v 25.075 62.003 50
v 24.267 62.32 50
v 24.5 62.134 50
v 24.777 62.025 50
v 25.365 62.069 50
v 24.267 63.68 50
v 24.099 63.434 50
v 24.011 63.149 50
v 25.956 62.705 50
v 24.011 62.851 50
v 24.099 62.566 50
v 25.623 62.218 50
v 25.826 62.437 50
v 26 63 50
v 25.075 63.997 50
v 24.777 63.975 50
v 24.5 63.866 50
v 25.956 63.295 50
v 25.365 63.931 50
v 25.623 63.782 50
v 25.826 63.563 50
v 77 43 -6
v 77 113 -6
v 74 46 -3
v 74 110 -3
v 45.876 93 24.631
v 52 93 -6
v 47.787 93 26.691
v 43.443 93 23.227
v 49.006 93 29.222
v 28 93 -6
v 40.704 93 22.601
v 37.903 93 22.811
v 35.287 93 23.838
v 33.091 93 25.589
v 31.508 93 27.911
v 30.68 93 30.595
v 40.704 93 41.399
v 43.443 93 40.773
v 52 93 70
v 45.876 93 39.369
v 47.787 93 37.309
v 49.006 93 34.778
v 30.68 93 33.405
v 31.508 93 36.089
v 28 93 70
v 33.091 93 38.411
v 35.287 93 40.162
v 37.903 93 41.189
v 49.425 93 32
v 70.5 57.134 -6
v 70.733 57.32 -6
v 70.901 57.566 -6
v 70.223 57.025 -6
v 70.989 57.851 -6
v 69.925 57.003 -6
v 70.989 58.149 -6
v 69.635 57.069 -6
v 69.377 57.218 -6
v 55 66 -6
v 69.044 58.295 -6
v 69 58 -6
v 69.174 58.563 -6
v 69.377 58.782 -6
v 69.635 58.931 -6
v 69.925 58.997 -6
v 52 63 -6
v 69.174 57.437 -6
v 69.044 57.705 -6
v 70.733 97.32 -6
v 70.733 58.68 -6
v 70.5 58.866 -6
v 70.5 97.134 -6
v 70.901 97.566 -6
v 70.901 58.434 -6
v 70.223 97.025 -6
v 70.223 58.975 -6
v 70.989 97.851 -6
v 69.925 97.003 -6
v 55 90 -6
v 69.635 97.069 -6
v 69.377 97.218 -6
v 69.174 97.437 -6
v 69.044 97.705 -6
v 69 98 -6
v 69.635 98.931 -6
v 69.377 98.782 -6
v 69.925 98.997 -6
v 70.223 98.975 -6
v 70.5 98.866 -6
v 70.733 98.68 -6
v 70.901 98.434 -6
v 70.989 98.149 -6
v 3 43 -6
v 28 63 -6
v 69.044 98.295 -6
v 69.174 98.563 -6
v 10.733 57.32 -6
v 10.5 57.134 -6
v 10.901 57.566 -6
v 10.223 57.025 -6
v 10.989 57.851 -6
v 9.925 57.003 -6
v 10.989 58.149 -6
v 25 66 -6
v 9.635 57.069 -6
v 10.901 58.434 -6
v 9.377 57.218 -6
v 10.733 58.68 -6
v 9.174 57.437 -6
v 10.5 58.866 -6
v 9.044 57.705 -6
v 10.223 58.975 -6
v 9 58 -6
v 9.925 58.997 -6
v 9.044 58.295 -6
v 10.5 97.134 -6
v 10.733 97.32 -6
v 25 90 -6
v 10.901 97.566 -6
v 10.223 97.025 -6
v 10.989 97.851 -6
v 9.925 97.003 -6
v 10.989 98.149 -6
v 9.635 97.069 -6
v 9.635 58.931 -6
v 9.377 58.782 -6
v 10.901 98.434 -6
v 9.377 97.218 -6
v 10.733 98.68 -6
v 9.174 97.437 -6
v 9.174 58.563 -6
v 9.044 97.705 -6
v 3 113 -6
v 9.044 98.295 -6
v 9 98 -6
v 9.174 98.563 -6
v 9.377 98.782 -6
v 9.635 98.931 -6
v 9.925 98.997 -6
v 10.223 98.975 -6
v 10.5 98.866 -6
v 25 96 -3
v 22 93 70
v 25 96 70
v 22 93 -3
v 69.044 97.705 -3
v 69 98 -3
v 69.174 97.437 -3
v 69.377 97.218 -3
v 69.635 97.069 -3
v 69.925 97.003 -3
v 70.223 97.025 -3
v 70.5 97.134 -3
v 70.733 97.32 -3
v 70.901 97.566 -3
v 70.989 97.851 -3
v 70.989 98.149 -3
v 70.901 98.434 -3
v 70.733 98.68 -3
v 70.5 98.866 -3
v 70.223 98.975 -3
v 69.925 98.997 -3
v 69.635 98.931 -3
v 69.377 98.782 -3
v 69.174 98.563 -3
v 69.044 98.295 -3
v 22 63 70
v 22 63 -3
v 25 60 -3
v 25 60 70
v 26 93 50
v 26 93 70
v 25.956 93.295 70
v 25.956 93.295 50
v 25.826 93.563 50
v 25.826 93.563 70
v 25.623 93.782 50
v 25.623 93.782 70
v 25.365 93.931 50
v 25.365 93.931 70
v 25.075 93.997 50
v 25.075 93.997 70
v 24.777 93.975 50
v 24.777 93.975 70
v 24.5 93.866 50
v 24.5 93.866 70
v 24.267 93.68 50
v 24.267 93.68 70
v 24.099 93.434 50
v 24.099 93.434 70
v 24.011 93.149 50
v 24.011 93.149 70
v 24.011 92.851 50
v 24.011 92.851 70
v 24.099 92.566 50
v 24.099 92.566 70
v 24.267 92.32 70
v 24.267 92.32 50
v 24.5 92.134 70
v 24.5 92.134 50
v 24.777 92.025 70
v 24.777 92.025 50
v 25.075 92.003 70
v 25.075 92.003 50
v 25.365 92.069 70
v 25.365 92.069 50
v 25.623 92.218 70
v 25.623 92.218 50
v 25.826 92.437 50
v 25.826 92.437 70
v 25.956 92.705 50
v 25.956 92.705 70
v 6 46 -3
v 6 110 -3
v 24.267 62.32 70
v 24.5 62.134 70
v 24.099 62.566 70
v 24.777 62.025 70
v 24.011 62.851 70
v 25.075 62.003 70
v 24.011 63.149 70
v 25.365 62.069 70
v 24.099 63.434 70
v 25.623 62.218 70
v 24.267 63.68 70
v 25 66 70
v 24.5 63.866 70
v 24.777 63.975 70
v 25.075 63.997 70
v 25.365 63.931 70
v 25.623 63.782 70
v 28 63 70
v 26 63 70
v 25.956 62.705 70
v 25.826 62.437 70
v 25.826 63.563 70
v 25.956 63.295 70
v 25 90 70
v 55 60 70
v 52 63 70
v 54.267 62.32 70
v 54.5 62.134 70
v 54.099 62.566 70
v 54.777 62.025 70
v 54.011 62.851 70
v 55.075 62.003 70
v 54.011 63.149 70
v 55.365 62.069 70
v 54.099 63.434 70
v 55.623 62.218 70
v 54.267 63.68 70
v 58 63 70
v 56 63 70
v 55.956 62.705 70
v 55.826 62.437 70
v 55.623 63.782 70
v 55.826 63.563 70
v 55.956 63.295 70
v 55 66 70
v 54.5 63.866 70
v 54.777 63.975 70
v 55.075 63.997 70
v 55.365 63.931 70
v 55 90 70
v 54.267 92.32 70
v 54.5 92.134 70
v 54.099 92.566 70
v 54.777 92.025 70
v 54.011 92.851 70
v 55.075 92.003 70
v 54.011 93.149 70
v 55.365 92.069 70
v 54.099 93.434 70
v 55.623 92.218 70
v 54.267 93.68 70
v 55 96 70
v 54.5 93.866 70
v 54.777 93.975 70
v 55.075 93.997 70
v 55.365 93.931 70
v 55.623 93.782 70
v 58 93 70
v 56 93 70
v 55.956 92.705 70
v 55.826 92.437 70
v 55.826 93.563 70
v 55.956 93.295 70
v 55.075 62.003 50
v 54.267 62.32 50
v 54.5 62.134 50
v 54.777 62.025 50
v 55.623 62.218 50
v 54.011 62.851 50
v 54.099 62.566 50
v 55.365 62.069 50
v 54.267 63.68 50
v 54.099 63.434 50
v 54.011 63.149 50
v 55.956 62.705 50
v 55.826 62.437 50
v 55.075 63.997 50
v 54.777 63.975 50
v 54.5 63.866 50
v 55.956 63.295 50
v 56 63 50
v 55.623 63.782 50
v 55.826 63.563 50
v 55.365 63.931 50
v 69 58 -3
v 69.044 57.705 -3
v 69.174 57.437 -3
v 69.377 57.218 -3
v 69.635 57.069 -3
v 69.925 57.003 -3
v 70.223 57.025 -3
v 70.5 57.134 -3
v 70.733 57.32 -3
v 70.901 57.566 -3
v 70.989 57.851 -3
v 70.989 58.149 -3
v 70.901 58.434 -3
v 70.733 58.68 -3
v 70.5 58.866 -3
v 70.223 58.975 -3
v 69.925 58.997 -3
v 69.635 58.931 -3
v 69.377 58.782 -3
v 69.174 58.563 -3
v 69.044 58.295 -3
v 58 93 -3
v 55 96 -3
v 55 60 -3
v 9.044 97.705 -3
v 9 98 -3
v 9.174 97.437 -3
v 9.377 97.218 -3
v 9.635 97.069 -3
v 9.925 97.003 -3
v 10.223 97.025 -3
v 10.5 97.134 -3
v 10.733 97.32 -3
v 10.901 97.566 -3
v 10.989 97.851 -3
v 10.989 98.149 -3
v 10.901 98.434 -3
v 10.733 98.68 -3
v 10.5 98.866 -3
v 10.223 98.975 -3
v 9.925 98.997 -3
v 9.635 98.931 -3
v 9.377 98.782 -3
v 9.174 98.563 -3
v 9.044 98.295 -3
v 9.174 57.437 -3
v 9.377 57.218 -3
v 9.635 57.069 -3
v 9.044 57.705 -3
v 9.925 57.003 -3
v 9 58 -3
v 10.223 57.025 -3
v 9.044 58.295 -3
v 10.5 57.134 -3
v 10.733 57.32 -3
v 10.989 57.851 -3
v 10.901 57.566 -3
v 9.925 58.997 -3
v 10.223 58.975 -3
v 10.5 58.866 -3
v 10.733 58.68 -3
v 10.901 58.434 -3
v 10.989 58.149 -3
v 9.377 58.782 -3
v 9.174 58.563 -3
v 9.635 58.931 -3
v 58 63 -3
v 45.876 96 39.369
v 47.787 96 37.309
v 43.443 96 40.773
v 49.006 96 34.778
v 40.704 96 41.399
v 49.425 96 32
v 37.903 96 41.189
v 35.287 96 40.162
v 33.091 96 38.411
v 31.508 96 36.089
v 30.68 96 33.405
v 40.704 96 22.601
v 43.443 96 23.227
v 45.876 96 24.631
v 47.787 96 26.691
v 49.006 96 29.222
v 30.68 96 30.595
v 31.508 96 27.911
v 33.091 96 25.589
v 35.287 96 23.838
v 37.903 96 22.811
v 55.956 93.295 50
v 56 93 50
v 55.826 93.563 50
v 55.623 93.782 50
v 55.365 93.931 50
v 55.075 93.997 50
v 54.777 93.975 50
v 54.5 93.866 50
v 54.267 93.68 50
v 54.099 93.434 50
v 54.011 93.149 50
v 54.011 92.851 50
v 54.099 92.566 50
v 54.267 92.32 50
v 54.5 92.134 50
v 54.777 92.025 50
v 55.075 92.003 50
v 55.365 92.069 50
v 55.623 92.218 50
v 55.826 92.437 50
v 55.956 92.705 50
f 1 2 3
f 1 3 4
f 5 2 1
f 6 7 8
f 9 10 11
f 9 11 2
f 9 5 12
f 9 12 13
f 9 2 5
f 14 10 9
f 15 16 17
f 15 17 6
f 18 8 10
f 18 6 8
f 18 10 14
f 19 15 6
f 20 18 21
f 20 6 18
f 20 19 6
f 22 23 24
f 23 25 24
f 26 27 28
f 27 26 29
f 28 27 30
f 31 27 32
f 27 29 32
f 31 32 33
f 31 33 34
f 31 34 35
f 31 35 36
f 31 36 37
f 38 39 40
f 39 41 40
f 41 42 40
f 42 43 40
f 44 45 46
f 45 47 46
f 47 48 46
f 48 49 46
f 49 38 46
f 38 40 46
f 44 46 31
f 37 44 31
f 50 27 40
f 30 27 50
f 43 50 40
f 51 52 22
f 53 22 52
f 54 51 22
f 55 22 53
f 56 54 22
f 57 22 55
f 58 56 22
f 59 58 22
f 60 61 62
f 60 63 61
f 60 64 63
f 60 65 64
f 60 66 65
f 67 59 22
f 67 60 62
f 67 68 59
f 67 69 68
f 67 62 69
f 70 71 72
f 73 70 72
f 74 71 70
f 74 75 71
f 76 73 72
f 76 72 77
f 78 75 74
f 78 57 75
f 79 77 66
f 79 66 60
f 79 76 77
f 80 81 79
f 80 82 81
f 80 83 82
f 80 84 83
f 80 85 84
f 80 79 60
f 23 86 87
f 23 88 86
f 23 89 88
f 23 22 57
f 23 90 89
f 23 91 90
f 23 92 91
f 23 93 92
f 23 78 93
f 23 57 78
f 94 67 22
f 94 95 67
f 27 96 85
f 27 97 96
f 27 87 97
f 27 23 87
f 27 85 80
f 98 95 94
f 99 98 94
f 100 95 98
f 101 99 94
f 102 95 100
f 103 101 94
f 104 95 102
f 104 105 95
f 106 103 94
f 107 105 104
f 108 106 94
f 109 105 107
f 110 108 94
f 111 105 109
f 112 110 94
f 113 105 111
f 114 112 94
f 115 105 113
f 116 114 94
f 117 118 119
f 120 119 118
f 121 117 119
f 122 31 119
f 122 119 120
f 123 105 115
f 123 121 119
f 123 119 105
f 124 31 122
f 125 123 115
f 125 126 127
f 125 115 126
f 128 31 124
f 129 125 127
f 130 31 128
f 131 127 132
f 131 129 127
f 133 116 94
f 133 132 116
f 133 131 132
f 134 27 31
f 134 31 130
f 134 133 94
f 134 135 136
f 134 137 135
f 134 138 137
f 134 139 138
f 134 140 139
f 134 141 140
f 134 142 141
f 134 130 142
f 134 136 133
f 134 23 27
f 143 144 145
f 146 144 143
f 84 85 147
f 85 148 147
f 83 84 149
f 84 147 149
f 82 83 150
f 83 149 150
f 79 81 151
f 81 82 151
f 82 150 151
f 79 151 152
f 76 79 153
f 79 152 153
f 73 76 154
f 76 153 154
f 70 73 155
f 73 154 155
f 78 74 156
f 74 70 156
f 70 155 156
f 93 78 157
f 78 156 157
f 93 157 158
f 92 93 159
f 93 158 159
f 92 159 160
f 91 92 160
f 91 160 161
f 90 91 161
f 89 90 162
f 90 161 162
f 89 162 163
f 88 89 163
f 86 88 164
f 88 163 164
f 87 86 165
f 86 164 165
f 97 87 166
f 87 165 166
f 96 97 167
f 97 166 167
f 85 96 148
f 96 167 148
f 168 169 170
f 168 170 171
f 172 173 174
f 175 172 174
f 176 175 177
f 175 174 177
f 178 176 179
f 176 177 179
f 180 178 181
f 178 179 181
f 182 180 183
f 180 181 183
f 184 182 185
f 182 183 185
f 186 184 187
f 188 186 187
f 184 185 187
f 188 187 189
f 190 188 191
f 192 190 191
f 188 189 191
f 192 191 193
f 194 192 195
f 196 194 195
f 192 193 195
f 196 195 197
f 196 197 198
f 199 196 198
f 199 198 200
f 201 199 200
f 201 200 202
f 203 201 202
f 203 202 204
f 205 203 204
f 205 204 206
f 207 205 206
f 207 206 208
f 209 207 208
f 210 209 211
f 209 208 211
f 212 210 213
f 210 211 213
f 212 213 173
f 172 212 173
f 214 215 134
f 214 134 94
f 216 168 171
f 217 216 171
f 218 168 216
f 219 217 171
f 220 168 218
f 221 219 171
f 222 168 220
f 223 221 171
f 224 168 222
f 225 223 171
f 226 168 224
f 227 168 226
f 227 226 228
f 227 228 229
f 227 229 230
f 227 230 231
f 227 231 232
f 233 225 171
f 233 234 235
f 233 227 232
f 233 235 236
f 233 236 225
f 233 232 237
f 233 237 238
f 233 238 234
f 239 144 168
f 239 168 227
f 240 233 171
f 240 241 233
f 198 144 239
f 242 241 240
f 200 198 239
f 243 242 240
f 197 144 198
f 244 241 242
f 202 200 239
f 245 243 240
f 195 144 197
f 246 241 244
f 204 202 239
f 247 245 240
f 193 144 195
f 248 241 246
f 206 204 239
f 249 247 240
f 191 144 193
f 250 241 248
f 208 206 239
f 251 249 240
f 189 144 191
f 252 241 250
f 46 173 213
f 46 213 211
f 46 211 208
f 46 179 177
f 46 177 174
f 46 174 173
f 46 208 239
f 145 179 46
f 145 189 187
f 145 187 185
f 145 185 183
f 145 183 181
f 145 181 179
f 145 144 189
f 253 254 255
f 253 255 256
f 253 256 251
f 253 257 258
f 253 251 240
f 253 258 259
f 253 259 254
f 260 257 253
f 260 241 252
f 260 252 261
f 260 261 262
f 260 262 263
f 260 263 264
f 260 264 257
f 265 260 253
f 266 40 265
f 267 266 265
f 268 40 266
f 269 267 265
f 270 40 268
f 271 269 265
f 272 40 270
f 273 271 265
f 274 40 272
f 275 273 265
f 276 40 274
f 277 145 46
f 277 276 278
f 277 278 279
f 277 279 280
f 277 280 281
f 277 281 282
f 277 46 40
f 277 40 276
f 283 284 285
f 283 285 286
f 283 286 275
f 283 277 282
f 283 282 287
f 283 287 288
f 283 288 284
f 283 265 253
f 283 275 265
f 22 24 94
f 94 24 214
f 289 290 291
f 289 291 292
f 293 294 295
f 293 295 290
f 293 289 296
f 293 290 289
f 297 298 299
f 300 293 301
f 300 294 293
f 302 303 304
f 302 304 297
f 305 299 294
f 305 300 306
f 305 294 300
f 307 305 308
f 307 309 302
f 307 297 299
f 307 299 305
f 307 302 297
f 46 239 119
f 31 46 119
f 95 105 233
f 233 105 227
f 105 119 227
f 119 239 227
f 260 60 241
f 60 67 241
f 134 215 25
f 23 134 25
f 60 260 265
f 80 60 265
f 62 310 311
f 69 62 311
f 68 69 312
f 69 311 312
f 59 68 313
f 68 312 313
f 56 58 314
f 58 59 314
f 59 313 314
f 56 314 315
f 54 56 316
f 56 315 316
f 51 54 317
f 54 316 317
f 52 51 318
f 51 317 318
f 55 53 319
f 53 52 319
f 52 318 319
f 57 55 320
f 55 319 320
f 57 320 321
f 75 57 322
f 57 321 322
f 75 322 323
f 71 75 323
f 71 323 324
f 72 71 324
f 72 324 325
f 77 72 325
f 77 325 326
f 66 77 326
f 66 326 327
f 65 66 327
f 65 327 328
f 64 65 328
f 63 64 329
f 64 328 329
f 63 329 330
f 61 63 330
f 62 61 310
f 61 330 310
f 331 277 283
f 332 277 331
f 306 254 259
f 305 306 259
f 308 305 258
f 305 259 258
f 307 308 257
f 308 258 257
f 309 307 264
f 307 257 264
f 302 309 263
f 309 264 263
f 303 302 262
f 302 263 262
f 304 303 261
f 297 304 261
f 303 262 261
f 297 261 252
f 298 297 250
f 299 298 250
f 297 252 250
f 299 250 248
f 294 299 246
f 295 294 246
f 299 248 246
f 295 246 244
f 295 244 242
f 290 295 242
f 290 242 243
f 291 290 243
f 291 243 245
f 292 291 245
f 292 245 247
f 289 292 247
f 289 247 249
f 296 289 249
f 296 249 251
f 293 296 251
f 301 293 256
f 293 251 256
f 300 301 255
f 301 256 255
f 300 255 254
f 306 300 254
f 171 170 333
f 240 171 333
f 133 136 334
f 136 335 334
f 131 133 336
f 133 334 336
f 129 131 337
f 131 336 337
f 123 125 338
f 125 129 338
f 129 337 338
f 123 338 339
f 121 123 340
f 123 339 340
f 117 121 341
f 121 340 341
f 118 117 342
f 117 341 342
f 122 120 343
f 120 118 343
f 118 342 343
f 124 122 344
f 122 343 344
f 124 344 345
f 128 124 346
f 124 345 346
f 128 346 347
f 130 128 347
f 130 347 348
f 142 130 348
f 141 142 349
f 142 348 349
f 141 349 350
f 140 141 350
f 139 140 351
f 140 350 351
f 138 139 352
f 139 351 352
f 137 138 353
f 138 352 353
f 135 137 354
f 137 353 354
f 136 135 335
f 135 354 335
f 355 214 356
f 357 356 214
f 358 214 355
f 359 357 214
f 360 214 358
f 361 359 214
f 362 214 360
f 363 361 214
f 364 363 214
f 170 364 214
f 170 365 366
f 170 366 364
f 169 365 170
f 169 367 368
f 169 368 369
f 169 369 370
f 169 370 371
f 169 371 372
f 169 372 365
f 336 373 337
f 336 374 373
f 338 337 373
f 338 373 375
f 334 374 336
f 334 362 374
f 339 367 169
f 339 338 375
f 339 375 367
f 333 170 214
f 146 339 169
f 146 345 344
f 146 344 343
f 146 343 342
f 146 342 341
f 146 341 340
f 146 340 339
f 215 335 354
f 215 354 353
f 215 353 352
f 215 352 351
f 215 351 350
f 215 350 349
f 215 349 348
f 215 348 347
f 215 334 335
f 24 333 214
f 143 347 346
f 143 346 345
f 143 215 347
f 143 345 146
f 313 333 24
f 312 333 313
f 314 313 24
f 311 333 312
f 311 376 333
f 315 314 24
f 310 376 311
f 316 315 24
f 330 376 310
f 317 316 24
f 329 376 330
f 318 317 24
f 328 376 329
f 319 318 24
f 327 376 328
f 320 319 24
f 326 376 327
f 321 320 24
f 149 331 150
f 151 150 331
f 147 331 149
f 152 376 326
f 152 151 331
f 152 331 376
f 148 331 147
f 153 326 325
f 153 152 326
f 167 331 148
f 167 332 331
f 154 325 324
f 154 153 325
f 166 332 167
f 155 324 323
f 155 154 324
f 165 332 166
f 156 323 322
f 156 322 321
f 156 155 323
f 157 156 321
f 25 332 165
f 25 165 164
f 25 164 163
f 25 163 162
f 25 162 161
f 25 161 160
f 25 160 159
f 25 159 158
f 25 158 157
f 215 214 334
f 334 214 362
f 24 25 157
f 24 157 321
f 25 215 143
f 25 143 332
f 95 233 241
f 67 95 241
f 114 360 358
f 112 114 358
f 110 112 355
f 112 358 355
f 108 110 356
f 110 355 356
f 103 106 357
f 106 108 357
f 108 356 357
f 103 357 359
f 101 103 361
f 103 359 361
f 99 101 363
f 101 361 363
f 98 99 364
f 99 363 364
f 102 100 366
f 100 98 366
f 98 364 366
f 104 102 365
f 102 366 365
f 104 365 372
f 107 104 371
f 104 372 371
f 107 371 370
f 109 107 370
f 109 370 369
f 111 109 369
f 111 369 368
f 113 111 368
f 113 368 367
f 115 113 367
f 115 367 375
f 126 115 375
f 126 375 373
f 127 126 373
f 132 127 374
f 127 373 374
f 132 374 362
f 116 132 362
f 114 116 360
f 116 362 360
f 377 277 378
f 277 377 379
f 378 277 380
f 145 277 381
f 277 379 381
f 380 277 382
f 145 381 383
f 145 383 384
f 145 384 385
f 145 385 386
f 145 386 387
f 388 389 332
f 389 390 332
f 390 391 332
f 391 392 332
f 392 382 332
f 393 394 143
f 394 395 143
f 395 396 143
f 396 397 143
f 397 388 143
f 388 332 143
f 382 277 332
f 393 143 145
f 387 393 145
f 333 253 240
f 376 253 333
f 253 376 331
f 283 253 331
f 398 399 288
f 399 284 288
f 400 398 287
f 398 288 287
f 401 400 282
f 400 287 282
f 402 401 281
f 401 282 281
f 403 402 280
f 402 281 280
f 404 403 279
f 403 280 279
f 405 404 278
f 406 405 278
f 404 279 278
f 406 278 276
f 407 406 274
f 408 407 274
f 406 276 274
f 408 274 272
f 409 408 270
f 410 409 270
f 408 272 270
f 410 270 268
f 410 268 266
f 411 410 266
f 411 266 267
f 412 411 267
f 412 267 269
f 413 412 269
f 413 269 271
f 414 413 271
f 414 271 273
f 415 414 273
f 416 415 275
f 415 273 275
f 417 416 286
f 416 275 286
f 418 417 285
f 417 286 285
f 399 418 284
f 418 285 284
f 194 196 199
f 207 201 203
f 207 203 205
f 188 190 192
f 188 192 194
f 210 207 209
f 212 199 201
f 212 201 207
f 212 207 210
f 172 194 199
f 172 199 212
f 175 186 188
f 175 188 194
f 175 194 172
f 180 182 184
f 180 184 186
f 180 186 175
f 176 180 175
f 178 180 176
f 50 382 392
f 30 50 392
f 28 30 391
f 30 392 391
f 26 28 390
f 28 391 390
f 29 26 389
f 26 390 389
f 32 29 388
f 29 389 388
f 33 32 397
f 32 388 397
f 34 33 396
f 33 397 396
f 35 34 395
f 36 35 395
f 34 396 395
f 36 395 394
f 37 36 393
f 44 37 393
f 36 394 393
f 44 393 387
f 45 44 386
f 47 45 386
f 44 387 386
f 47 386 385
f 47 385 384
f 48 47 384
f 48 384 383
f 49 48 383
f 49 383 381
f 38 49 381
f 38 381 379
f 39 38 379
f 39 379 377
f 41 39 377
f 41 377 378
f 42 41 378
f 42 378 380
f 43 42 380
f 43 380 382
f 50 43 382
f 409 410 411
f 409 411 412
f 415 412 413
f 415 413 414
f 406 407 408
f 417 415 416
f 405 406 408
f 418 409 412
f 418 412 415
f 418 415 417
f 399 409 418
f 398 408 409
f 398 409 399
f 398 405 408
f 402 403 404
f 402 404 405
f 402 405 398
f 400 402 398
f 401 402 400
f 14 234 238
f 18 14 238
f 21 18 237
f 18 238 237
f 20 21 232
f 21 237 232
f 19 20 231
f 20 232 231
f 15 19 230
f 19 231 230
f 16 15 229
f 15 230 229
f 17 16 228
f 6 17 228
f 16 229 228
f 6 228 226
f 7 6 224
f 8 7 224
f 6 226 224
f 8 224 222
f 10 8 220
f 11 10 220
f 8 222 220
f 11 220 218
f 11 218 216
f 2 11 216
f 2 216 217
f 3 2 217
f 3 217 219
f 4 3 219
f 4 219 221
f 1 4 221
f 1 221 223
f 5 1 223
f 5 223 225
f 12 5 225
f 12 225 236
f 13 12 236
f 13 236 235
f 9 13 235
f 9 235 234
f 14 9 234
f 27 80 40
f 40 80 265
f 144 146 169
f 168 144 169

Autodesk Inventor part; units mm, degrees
ref_plane "YZ Plane" through (0, 0, 0) normal (1, 0, 0) x (0, 1, 0)
ref_plane "XZ Plane" through (0, 0, 0) normal (0, 1, 0) x (-1, 0, 0)
ref_plane "XY Plane" through (0, 0, 0) normal (0, 0, 1) x (1, 0, 0)
sketch "Sketch1" plane through (0, 0, 0) normal (0, 0, 1) x (1, 0, 0)
  line L0 (0, 0) -> (80, 0)
  line L1 (80, 0) -> (80, 125.359)
  line L2 (60, 200) -> (80, 125.359)
  line L3 (60, 200) -> (137.2741, 200) construction
  line L4 (0, 0) -> (0, 125.359)
  line L5 (20, 200) -> (0, 125.359)
  line L6 (84, 125.8856) -> (84, -4)
  line L7 (84, -4) -> (-4, -4)
  line L8 (-4, -4) -> (-4, 125.8856)
  line L9 (-4, 125.8856) -> (16.9307, 204)
  line L10 (63.0693, 204) -> (84, 125.8856)
  line L11 (20, 204) -> (20, 200)
  line L12 (60, 200) -> (60, 204)
  line L13 (16.9307, 204) -> (20, 204)
  line L14 (60, 204) -> (63.0693, 204)
  point P0 (40, 0)
  dimension "d0" = 80
  dimension "d4" = 75
  dimension "d5" = 4
extrude "Extrusion1" add sketch "Sketch1" along normal blind 70
sketch "Sketch2" plane through (0, 0, 0) normal (0, 0, -1) x (-1, 0, 0)
  line L0 (-16.9307, 204) -> (4, 125.8856) projected
  line L1 (-84, 125.8856) -> (-63.0693, 204) projected
  line L2 (-16.9307, 204) -> (-63.0693, 204)
  line L3 (-80, 125.359) -> (-80, 0) projected
  line L4 (-60, 200) -> (-80, 125.359) projected
  line L5 (-60, 204) -> (-60, 200) projected
  line L6 (-63.0693, 204) -> (-60, 204) projected
  line L7 (-84, 125.8856) -> (-63.0693, 204) projected
  line L8 (-84, -4) -> (-84, 125.8856) projected
  line L9 (4, -4) -> (-84, -4) projected
  line L10 (4, 125.8856) -> (4, -4) projected
  line L11 (-16.9307, 204) -> (4, 125.8856) projected
  line L12 (-20, 204) -> (-16.9307, 204) projected
  line L13 (-20, 200) -> (-20, 204) projected
  line L14 (0, 125.359) -> (-20, 200) projected
  line L15 (0, 0) -> (0, 125.359) projected
  line L16 (-80, 0) -> (0, 0) projected
extrude "Extrusion2" add sketch "Sketch2" along normal blind 3
chamfer "Chamfer1" distance 5 angle 45 5 edges at (40, -4, -3) (84, 60.9428, -3) (-4, 60.9428, -3) (6.4653, 164.9428, -3) (73.5347, 164.9428, -3)
chamfer "Chamfer2" distance 3 angle 45 7 edges at (20, 202, 0) (10, 162.6795, 0) (60, 202, 0) (70, 162.6795, 0) (80, 62.6795, 0) (0, 62.6795, 0) (40, 0, 0)
chamfer "Chamfer3" distance 3 angle 45 4 edges at (84, -4, 36) (-4, -4, 36) (0, 0, 36.5) (80, 0, 36.5)
sketch "Sketch3" plane through (0, 0, 70) normal (0, 0, 1) x (1, 0, 0)
  line L0 (77, 0) -> (78.5, 1.5) projected
  line L1 (81, -4) -> (82.5, -2.5) projected
  line L2 (78.5, 1.5) -> (82.5, -2.5)
  line L3 (79, 1) -> (82.5, -2.5) projected
  circle A0 centre (80.75, -0.75) radius 1
  line L4 (-4, -1) -> (-2.5, -2.5) projected
  line L5 (-2.5, -2.5) -> (1.5, 1.5)
  line L6 (0, 3) -> (3, 0) projected
  line L7 (1, 1) -> (-2.5, -2.5) projected
  circle A1 centre (-0.75, -0.75) radius 1
  line L8 (3, 124.964) -> (0, 125.359) projected
  line L9 (16.9307, 204) -> (-4, 125.8856) projected
  line L10 (80, 125.359) -> (77, 124.964) projected
  line L11 (84, -1) -> (84, 125.8856) projected
  line L12 (1, 125.2273) -> (-4, 125.8856) projected
  circle A2 centre (82, 125.6223) radius 1
  circle A3 centre (-2, 125.6223) radius 1
  point P0 (0, 0)
  dimension "d19" = 2
  dimension "d20" = 2
  dimension "d22" = 2
  dimension "d23" = 2
extrude "Extrusion3" cut sketch "Sketch3" against normal blind 5
sketch "Sketch4" plane through (22.1071, 204, -3) normal (0, 1, 0) x (1, 0, 0)
  line L0 (35.7859, 0) -> (40.9622, -5) projected
  line L1 (38.374, -2.5) -> (36.3929, -4.5)
  line L2 (34.8929, -3) -> (37.8929, -6) projected
  circle A0 centre (37.3835, -3.5) radius 1
  line L3 (-21.1071, 0) -> (56.8929, 0) projected
  line L4 (17.8929, 0) -> (17.8929, -26)
  circle A1 centre (-1.5976, -3.5) radius 1
  point P0 (-22.1071, -3)
  dimension "d26" = 2
extrude "Extrusion4" cut sketch "Sketch4" against normal blind 15
sketch "Sketch5" plane through (0, 0, 0) normal (0, 0, 1) x (1, 0, 0)
  line L0 (77, 3) -> (3, 3) projected
  line L1 (40, 3) -> (40, 43)
  line L2 (40, 43) -> (40, 113)
  line L3 (40, 78) -> (20, 78)
  line L4 (20, 78) -> (20, 55.5)
  line L5 (20, 55.5) -> (60, 55.5)
  line L6 (60, 55.5) -> (60, 100.5)
  line L7 (60, 100.5) -> (20, 100.5)
  line L8 (20, 100.5) -> (20, 78)
  line L9 (40, 78) -> (70, 78)
  line L10 (70, 78) -> (70, 98)
  circle A0 centre (70, 98) radius 1
  line L11 (70, 78) -> (70, 58)
  circle A1 centre (70, 58) radius 1
  circle A2 centre (10, 98) radius 1
  circle A3 centre (10, 58) radius 1
  line L12 (40, 113) -> (40, 133)
  line L13 (40, 133) -> (63.1521, 133)
  line L14 (63.1521, 133) -> (63.1521, 155.7076)
  circle A4 centre (63.1521, 155.7076) radius 1.5
  circle A5 centre (63.1521, 133) radius 1.5
  circle A6 centre (16.8479, 155.7076) radius 1.5
  circle A7 centre (16.8479, 133) radius 1.5
  point P0 (0, 0)
  dimension "d29" = 40
  dimension "d30" = 70
  dimension "d31" = 20
  dimension "d32" = 22.5
  dimension "d33" = 40
  dimension "d34" = 45
  dimension "d35" = 30
  dimension "d36" = 20
  dimension "d37" = 2
  dimension "d38" = 20
  dimension "d39" = 2
  dimension "d40" = 20
  dimension "d41" = 23.1521
  dimension "d42" = 22.7076
  dimension "d43" = 3
  dimension "d44" = 3
extrude "Extrusion5" cut sketch "Sketch5" against normal blind 40
sketch "Sketch7" plane through (-1, -4, 2) normal (0, -1, 0) x (1, 0, 0)
  line L0 (78, 68) -> (4, 68) projected
  line L1 (41, 68) -> (41, 34)
  line L2 (54.7, 34) -> (27.3, 34)
  line L3 (54.7, 34) -> (54.7, 20.8)
  line L4 (54.7, 20.8) -> (27.3, 20.8)
  line L5 (27.3, 34) -> (27.3, 20.8)
  point P0 (1, -2)
  dimension "d47" = 27.4
  dimension "d48" = 34
  dimension "d49" = 13.2
extrude "Extrusion6" cut sketch "Sketch7" against normal blind 27.4
sketch "Sketch8" plane through (-4, 125.8856, 2) normal (-0.9659258, 0.258819, 0) x (0, 0, 1)
  line L0 (-2, 13.7678) -> (-2, 10.7678) projected
  line L1 (-2, 35.7017) -> (-2, 32.7017) projected
  line L2 (3.9828, 34.5121) -> (3.9828, 12.5782)
  line L3 (3.9828, 23.5451) -> (5.9828, 23.5451)
  line L4 (5.9828, 23.5451) -> (12.9828, 23.5451)
  line L5 (12.9828, 23.5451) -> (12.9828, 30.2951)
  line L6 (12.9828, 30.2951) -> (12.9828, 16.7951)
  line L7 (12.9828, 16.7951) -> (5.9828, 16.7951)
  line L8 (5.9828, 16.7951) -> (5.9828, 29.9848)
  line L9 (5.9828, 29.9848) -> (12.9828, 30.2951)
  point P0 (-2, -120.5609)
  point P1 (12.9828, 30.2951)
  dimension "d52" = 2
  dimension "d53" = 7
  dimension "d54" = 6.75
  dimension "d55" = 13.5
extrude "Extrusion7" cut sketch "Sketch8" against normal blind 9
chamfer "Chamfer4" distance 1 angle 45 4 edges at (5.7728, 154.6308, 14.9828) (2.2788, 141.5908, 14.9828) (2.2788, 141.5908, 7.9828) (5.6925, 154.331, 7.9828)
sketch "Sketch9" plane through (-4, 125.8856, 2) normal (-1, 0, 0) x (0, 0, 1)
  line L0 (1, -0.5266) -> (1, -122.8856) projected
  line L1 (1, -48.8247) -> (7.6436, -48.8247)
  line L2 (7.6436, -48.8247) -> (7.6436, -34.3247)
  line L3 (7.6436, -34.3247) -> (7.6436, -63.3247)
  circle A0 centre (7.6436, -34.3247) radius 2
  circle A1 centre (7.6436, -63.3247) radius 2
  point P0 (-2, -125.8856)
  dimension "d61" = 14.5
  dimension "d62" = 29
  dimension "d63" = 4
  dimension "d64" = 4
extrude "Extrusion8" cut sketch "Sketch9" against normal blind 999
sketch "Sketch17" plane through (0, 0, -3) normal (0, 0, -1) x (-1, 0, 0)
  line L0 (-60, 55.5) -> (-60, 100.5) projected
  line L1 (-60, 78) -> (-77, 78)
  line L2 (-77, 124.964) -> (-77, 3) projected
  line L3 (-77, 78) -> (-77, 43)
  line L4 (-77, 78) -> (-77, 113)
  line L5 (-60, 55.5) -> (-20, 55.5) projected
  line L6 (-40, 55.5) -> (-40, 37.7198)
  line L7 (-20, 55.5) -> (-20, 100.5)
  line L8 (-20, 78) -> (-3, 78)
  line L9 (-3, 78) -> (-3, 43)
  line L10 (-3, 78) -> (-3, 113)
  line L11 (-20, 55.5) -> (-60, 55.5)
  line L12 (-77, 43) -> (-3, 43)
  line L13 (-3, 3) -> (-3, 124.964) projected
  line L14 (-3, 113) -> (-77, 113)
  line L15 (-79, 1) -> (-79, 125.2273) projected
  circle A0 centre (-63.1521, 133) radius 1.5 projected
  circle A1 centre (-70, 98) radius 1 projected
  circle A2 centre (-10, 58) radius 1 projected
  circle A3 centre (-16.8479, 133) radius 1.5 projected
  circle A4 centre (-63.1521, 155.7076) radius 1.5 projected
  circle A5 centre (-70, 58) radius 1 projected
  circle A6 centre (-10, 98) radius 1 projected
  circle A7 centre (-16.8479, 155.7076) radius 1.5 projected
  line L16 (-20, 55.5) -> (-60, 55.5) projected
  line L17 (-60, 55.5) -> (-60, 100.5) projected
  line L18 (-60, 100.5) -> (-20, 100.5) projected
  line L19 (-20, 100.5) -> (-20, 55.5) projected
  line L20 (-79, 125.2273) -> (-57.8929, 204) projected
  line L21 (-79, 1) -> (-79, 125.2273) projected
  line L22 (-1, 1) -> (-79, 1) projected
  line L23 (-1, 125.2273) -> (-1, 1) projected
  line L24 (-22.1071, 204) -> (-1, 125.2273) projected
  line L25 (-22.1071, 204) -> (-57.8929, 204) projected
  point P0 (0, 0)
  dimension "d106" = 35
  dimension "d107" = 35
extrude "Extrusion16" add sketch "Sketch17" along normal blind 3 contours L5 L6 L12 L2 L1 L0 | L0 L18 L7 L5 | L1 L2 L14 L10 L8 L7 L18 L0 | L5 L7 L8 L9 L12 L6
sketch "Sketch18" plane through (0, 0, 70) normal (0, 0, 1) x (1, 0, 0)
  line L0 (-145.0841, -156.9657) -> (0, 339.906)
  line L1 (0, 339.906) -> (209.9789, 212.1699)
  line L2 (209.9789, 212.1699) -> (104.9894, -207.8436)
  line L3 (104.9894, -207.8436) -> (-145.0841, -156.9657)
  point P0 (0, 0)
extrude "Extrusion17" cut sketch "Sketch18" against normal blind 73
sketch "Sketch19" plane through (0, 0, -3) normal (0, 0, 1) x (1, 0, 0)
  line L0 (3, 113) -> (77, 113) projected
  line L1 (77, 43) -> (3, 43) projected
  line L2 (40, 43) -> (40, 113)
  line L3 (40, 78) -> (25, 78)
  line L4 (25, 78) -> (25, 63)
  line L5 (25, 63) -> (40, 63)
  line L6 (40, 63) -> (55, 63)
  line L7 (55, 63) -> (55, 93)
  line L8 (55, 93) -> (25, 93)
  line L9 (25, 93) -> (25, 78)
  line L10 (22, 78) -> (22, 60)
  line L11 (22, 60) -> (40, 60)
  line L12 (40, 60) -> (58, 60)
  line L13 (58, 60) -> (58, 96)
  line L14 (58, 96) -> (22, 96)
  line L15 (22, 96) -> (22, 78)
  point P0 (0, 0)
  dimension "d112" = 15
  dimension "d113" = 15
  dimension "d114" = 15
  dimension "d115" = 15
  dimension "d116" = 30
  dimension "d117" = 3
extrude "Extrusion18" add sketch "Sketch19" along normal blind 73 contours L11 L10 L15 L14 L2 L8 L9 L4 L5 | L2 L6 L7 L8 L14 L13 L12
sketch "Sketch20" plane through (0, 0, -3) normal (0, 0, 1) x (1, 0, 0)
  line L0 (25, 93) -> (25, 63) projected
  line L1 (25, 63) -> (55, 63) projected
  line L2 (55, 63) -> (55, 93) projected
  line L3 (55, 93) -> (25, 93) projected
  point P0 (0, 0)
extrude "Extrusion19" cut sketch "Sketch20" against normal blind 73
chamfer "Chamfer7" distance 3 angle 45 8 edges at (58, 60, 33.5) (25, 93, 32) (58, 96, 33.5) (55, 63, 32) (22, 96, 33.5) (55, 93, 32) (25, 63, 32) (22, 60, 33.5)
chamfer "Chamfer8" distance 3 angle 45 4 edges at (3, 78, -3) (40, 43, -3) (77, 78, -3) (40, 113, -3)
sketch "Sketch21" plane through (25, 96, -3) normal (0, 1, 0) x (1, 0, 0)
  line L0 (0, -73) -> (0, 0) projected
  line L1 (30, -73) -> (0, -73) projected
  line L2 (30, 0) -> (30, -73) projected
  line L3 (0, 0) -> (30, 0) projected
  line L4 (0, -73) -> (0, 3) projected
  line L5 (0, -35) -> (30, -35)
  line L6 (30, -73) -> (30, 0) projected
  circle A0 centre (15, -35) radius 9.425
  point P0 (-25, -3)
  dimension "d128" = 18.85
extrude "Extrusion20" cut sketch "Sketch21" against normal blind 3 contours A0 L5 | L5 A0
sketch "Sketch22" plane through (0, 0, 70) normal (0, 0, 1) x (1, 0, 0)
  line L0 (25, 60) -> (22, 63) projected
  line L1 (25, 60) -> (55, 60) projected
  line L2 (58, 63) -> (55, 60) projected
  line L3 (58, 63) -> (58, 93) projected
  line L4 (55, 96) -> (58, 93) projected
  line L5 (55, 96) -> (25, 96) projected
  line L6 (22, 93) -> (25, 96) projected
  line L7 (22, 93) -> (22, 63) projected
  line L8 (28, 93) -> (52, 93) projected
  line L9 (55, 90) -> (52, 93) projected
  line L10 (55, 90) -> (55, 66) projected
  line L11 (52, 63) -> (55, 66) projected
  line L12 (52, 63) -> (28, 63) projected
  line L13 (25, 66) -> (28, 63) projected
  line L14 (25, 66) -> (25, 90) projected
  line L15 (28, 93) -> (25, 90) projected
  line L16 (25, 90) -> (28, 93) projected
  line L17 (26.5, 91.5) -> (23.5, 94.5)
  line L18 (22, 93) -> (25, 96) projected
  line L19 (25, 60) -> (22, 63) projected
  line L20 (23.5, 61.5) -> (26.5, 64.5)
  line L21 (28, 63) -> (25, 66) projected
  line L22 (56.5, 61.5) -> (53.5, 64.5)
  line L23 (53.5, 91.5) -> (56.5, 94.5)
  line L24 (58, 93) -> (55, 96) projected
  circle A0 centre (25, 63) radius 1
  circle A1 centre (55, 63) radius 1
  circle A2 centre (55, 93) radius 1
  circle A3 centre (25, 93) radius 1
  point P0 (0, 0)
  dimension "d131" = 2
  dimension "d132" = 2
  dimension "d133" = 2
  dimension "d134" = 2
extrude "Extrusion21" cut sketch "Sketch22" against normal blind 20 contours A0 L20 | L20 A0 | A1 L22 | L22 A1 | A3 L17 | L17 A3 | A2 L23 | L23 A2
equation "\"d45\" = d33"
equation "\"d50\" = d47"
properties part number "the handle"
